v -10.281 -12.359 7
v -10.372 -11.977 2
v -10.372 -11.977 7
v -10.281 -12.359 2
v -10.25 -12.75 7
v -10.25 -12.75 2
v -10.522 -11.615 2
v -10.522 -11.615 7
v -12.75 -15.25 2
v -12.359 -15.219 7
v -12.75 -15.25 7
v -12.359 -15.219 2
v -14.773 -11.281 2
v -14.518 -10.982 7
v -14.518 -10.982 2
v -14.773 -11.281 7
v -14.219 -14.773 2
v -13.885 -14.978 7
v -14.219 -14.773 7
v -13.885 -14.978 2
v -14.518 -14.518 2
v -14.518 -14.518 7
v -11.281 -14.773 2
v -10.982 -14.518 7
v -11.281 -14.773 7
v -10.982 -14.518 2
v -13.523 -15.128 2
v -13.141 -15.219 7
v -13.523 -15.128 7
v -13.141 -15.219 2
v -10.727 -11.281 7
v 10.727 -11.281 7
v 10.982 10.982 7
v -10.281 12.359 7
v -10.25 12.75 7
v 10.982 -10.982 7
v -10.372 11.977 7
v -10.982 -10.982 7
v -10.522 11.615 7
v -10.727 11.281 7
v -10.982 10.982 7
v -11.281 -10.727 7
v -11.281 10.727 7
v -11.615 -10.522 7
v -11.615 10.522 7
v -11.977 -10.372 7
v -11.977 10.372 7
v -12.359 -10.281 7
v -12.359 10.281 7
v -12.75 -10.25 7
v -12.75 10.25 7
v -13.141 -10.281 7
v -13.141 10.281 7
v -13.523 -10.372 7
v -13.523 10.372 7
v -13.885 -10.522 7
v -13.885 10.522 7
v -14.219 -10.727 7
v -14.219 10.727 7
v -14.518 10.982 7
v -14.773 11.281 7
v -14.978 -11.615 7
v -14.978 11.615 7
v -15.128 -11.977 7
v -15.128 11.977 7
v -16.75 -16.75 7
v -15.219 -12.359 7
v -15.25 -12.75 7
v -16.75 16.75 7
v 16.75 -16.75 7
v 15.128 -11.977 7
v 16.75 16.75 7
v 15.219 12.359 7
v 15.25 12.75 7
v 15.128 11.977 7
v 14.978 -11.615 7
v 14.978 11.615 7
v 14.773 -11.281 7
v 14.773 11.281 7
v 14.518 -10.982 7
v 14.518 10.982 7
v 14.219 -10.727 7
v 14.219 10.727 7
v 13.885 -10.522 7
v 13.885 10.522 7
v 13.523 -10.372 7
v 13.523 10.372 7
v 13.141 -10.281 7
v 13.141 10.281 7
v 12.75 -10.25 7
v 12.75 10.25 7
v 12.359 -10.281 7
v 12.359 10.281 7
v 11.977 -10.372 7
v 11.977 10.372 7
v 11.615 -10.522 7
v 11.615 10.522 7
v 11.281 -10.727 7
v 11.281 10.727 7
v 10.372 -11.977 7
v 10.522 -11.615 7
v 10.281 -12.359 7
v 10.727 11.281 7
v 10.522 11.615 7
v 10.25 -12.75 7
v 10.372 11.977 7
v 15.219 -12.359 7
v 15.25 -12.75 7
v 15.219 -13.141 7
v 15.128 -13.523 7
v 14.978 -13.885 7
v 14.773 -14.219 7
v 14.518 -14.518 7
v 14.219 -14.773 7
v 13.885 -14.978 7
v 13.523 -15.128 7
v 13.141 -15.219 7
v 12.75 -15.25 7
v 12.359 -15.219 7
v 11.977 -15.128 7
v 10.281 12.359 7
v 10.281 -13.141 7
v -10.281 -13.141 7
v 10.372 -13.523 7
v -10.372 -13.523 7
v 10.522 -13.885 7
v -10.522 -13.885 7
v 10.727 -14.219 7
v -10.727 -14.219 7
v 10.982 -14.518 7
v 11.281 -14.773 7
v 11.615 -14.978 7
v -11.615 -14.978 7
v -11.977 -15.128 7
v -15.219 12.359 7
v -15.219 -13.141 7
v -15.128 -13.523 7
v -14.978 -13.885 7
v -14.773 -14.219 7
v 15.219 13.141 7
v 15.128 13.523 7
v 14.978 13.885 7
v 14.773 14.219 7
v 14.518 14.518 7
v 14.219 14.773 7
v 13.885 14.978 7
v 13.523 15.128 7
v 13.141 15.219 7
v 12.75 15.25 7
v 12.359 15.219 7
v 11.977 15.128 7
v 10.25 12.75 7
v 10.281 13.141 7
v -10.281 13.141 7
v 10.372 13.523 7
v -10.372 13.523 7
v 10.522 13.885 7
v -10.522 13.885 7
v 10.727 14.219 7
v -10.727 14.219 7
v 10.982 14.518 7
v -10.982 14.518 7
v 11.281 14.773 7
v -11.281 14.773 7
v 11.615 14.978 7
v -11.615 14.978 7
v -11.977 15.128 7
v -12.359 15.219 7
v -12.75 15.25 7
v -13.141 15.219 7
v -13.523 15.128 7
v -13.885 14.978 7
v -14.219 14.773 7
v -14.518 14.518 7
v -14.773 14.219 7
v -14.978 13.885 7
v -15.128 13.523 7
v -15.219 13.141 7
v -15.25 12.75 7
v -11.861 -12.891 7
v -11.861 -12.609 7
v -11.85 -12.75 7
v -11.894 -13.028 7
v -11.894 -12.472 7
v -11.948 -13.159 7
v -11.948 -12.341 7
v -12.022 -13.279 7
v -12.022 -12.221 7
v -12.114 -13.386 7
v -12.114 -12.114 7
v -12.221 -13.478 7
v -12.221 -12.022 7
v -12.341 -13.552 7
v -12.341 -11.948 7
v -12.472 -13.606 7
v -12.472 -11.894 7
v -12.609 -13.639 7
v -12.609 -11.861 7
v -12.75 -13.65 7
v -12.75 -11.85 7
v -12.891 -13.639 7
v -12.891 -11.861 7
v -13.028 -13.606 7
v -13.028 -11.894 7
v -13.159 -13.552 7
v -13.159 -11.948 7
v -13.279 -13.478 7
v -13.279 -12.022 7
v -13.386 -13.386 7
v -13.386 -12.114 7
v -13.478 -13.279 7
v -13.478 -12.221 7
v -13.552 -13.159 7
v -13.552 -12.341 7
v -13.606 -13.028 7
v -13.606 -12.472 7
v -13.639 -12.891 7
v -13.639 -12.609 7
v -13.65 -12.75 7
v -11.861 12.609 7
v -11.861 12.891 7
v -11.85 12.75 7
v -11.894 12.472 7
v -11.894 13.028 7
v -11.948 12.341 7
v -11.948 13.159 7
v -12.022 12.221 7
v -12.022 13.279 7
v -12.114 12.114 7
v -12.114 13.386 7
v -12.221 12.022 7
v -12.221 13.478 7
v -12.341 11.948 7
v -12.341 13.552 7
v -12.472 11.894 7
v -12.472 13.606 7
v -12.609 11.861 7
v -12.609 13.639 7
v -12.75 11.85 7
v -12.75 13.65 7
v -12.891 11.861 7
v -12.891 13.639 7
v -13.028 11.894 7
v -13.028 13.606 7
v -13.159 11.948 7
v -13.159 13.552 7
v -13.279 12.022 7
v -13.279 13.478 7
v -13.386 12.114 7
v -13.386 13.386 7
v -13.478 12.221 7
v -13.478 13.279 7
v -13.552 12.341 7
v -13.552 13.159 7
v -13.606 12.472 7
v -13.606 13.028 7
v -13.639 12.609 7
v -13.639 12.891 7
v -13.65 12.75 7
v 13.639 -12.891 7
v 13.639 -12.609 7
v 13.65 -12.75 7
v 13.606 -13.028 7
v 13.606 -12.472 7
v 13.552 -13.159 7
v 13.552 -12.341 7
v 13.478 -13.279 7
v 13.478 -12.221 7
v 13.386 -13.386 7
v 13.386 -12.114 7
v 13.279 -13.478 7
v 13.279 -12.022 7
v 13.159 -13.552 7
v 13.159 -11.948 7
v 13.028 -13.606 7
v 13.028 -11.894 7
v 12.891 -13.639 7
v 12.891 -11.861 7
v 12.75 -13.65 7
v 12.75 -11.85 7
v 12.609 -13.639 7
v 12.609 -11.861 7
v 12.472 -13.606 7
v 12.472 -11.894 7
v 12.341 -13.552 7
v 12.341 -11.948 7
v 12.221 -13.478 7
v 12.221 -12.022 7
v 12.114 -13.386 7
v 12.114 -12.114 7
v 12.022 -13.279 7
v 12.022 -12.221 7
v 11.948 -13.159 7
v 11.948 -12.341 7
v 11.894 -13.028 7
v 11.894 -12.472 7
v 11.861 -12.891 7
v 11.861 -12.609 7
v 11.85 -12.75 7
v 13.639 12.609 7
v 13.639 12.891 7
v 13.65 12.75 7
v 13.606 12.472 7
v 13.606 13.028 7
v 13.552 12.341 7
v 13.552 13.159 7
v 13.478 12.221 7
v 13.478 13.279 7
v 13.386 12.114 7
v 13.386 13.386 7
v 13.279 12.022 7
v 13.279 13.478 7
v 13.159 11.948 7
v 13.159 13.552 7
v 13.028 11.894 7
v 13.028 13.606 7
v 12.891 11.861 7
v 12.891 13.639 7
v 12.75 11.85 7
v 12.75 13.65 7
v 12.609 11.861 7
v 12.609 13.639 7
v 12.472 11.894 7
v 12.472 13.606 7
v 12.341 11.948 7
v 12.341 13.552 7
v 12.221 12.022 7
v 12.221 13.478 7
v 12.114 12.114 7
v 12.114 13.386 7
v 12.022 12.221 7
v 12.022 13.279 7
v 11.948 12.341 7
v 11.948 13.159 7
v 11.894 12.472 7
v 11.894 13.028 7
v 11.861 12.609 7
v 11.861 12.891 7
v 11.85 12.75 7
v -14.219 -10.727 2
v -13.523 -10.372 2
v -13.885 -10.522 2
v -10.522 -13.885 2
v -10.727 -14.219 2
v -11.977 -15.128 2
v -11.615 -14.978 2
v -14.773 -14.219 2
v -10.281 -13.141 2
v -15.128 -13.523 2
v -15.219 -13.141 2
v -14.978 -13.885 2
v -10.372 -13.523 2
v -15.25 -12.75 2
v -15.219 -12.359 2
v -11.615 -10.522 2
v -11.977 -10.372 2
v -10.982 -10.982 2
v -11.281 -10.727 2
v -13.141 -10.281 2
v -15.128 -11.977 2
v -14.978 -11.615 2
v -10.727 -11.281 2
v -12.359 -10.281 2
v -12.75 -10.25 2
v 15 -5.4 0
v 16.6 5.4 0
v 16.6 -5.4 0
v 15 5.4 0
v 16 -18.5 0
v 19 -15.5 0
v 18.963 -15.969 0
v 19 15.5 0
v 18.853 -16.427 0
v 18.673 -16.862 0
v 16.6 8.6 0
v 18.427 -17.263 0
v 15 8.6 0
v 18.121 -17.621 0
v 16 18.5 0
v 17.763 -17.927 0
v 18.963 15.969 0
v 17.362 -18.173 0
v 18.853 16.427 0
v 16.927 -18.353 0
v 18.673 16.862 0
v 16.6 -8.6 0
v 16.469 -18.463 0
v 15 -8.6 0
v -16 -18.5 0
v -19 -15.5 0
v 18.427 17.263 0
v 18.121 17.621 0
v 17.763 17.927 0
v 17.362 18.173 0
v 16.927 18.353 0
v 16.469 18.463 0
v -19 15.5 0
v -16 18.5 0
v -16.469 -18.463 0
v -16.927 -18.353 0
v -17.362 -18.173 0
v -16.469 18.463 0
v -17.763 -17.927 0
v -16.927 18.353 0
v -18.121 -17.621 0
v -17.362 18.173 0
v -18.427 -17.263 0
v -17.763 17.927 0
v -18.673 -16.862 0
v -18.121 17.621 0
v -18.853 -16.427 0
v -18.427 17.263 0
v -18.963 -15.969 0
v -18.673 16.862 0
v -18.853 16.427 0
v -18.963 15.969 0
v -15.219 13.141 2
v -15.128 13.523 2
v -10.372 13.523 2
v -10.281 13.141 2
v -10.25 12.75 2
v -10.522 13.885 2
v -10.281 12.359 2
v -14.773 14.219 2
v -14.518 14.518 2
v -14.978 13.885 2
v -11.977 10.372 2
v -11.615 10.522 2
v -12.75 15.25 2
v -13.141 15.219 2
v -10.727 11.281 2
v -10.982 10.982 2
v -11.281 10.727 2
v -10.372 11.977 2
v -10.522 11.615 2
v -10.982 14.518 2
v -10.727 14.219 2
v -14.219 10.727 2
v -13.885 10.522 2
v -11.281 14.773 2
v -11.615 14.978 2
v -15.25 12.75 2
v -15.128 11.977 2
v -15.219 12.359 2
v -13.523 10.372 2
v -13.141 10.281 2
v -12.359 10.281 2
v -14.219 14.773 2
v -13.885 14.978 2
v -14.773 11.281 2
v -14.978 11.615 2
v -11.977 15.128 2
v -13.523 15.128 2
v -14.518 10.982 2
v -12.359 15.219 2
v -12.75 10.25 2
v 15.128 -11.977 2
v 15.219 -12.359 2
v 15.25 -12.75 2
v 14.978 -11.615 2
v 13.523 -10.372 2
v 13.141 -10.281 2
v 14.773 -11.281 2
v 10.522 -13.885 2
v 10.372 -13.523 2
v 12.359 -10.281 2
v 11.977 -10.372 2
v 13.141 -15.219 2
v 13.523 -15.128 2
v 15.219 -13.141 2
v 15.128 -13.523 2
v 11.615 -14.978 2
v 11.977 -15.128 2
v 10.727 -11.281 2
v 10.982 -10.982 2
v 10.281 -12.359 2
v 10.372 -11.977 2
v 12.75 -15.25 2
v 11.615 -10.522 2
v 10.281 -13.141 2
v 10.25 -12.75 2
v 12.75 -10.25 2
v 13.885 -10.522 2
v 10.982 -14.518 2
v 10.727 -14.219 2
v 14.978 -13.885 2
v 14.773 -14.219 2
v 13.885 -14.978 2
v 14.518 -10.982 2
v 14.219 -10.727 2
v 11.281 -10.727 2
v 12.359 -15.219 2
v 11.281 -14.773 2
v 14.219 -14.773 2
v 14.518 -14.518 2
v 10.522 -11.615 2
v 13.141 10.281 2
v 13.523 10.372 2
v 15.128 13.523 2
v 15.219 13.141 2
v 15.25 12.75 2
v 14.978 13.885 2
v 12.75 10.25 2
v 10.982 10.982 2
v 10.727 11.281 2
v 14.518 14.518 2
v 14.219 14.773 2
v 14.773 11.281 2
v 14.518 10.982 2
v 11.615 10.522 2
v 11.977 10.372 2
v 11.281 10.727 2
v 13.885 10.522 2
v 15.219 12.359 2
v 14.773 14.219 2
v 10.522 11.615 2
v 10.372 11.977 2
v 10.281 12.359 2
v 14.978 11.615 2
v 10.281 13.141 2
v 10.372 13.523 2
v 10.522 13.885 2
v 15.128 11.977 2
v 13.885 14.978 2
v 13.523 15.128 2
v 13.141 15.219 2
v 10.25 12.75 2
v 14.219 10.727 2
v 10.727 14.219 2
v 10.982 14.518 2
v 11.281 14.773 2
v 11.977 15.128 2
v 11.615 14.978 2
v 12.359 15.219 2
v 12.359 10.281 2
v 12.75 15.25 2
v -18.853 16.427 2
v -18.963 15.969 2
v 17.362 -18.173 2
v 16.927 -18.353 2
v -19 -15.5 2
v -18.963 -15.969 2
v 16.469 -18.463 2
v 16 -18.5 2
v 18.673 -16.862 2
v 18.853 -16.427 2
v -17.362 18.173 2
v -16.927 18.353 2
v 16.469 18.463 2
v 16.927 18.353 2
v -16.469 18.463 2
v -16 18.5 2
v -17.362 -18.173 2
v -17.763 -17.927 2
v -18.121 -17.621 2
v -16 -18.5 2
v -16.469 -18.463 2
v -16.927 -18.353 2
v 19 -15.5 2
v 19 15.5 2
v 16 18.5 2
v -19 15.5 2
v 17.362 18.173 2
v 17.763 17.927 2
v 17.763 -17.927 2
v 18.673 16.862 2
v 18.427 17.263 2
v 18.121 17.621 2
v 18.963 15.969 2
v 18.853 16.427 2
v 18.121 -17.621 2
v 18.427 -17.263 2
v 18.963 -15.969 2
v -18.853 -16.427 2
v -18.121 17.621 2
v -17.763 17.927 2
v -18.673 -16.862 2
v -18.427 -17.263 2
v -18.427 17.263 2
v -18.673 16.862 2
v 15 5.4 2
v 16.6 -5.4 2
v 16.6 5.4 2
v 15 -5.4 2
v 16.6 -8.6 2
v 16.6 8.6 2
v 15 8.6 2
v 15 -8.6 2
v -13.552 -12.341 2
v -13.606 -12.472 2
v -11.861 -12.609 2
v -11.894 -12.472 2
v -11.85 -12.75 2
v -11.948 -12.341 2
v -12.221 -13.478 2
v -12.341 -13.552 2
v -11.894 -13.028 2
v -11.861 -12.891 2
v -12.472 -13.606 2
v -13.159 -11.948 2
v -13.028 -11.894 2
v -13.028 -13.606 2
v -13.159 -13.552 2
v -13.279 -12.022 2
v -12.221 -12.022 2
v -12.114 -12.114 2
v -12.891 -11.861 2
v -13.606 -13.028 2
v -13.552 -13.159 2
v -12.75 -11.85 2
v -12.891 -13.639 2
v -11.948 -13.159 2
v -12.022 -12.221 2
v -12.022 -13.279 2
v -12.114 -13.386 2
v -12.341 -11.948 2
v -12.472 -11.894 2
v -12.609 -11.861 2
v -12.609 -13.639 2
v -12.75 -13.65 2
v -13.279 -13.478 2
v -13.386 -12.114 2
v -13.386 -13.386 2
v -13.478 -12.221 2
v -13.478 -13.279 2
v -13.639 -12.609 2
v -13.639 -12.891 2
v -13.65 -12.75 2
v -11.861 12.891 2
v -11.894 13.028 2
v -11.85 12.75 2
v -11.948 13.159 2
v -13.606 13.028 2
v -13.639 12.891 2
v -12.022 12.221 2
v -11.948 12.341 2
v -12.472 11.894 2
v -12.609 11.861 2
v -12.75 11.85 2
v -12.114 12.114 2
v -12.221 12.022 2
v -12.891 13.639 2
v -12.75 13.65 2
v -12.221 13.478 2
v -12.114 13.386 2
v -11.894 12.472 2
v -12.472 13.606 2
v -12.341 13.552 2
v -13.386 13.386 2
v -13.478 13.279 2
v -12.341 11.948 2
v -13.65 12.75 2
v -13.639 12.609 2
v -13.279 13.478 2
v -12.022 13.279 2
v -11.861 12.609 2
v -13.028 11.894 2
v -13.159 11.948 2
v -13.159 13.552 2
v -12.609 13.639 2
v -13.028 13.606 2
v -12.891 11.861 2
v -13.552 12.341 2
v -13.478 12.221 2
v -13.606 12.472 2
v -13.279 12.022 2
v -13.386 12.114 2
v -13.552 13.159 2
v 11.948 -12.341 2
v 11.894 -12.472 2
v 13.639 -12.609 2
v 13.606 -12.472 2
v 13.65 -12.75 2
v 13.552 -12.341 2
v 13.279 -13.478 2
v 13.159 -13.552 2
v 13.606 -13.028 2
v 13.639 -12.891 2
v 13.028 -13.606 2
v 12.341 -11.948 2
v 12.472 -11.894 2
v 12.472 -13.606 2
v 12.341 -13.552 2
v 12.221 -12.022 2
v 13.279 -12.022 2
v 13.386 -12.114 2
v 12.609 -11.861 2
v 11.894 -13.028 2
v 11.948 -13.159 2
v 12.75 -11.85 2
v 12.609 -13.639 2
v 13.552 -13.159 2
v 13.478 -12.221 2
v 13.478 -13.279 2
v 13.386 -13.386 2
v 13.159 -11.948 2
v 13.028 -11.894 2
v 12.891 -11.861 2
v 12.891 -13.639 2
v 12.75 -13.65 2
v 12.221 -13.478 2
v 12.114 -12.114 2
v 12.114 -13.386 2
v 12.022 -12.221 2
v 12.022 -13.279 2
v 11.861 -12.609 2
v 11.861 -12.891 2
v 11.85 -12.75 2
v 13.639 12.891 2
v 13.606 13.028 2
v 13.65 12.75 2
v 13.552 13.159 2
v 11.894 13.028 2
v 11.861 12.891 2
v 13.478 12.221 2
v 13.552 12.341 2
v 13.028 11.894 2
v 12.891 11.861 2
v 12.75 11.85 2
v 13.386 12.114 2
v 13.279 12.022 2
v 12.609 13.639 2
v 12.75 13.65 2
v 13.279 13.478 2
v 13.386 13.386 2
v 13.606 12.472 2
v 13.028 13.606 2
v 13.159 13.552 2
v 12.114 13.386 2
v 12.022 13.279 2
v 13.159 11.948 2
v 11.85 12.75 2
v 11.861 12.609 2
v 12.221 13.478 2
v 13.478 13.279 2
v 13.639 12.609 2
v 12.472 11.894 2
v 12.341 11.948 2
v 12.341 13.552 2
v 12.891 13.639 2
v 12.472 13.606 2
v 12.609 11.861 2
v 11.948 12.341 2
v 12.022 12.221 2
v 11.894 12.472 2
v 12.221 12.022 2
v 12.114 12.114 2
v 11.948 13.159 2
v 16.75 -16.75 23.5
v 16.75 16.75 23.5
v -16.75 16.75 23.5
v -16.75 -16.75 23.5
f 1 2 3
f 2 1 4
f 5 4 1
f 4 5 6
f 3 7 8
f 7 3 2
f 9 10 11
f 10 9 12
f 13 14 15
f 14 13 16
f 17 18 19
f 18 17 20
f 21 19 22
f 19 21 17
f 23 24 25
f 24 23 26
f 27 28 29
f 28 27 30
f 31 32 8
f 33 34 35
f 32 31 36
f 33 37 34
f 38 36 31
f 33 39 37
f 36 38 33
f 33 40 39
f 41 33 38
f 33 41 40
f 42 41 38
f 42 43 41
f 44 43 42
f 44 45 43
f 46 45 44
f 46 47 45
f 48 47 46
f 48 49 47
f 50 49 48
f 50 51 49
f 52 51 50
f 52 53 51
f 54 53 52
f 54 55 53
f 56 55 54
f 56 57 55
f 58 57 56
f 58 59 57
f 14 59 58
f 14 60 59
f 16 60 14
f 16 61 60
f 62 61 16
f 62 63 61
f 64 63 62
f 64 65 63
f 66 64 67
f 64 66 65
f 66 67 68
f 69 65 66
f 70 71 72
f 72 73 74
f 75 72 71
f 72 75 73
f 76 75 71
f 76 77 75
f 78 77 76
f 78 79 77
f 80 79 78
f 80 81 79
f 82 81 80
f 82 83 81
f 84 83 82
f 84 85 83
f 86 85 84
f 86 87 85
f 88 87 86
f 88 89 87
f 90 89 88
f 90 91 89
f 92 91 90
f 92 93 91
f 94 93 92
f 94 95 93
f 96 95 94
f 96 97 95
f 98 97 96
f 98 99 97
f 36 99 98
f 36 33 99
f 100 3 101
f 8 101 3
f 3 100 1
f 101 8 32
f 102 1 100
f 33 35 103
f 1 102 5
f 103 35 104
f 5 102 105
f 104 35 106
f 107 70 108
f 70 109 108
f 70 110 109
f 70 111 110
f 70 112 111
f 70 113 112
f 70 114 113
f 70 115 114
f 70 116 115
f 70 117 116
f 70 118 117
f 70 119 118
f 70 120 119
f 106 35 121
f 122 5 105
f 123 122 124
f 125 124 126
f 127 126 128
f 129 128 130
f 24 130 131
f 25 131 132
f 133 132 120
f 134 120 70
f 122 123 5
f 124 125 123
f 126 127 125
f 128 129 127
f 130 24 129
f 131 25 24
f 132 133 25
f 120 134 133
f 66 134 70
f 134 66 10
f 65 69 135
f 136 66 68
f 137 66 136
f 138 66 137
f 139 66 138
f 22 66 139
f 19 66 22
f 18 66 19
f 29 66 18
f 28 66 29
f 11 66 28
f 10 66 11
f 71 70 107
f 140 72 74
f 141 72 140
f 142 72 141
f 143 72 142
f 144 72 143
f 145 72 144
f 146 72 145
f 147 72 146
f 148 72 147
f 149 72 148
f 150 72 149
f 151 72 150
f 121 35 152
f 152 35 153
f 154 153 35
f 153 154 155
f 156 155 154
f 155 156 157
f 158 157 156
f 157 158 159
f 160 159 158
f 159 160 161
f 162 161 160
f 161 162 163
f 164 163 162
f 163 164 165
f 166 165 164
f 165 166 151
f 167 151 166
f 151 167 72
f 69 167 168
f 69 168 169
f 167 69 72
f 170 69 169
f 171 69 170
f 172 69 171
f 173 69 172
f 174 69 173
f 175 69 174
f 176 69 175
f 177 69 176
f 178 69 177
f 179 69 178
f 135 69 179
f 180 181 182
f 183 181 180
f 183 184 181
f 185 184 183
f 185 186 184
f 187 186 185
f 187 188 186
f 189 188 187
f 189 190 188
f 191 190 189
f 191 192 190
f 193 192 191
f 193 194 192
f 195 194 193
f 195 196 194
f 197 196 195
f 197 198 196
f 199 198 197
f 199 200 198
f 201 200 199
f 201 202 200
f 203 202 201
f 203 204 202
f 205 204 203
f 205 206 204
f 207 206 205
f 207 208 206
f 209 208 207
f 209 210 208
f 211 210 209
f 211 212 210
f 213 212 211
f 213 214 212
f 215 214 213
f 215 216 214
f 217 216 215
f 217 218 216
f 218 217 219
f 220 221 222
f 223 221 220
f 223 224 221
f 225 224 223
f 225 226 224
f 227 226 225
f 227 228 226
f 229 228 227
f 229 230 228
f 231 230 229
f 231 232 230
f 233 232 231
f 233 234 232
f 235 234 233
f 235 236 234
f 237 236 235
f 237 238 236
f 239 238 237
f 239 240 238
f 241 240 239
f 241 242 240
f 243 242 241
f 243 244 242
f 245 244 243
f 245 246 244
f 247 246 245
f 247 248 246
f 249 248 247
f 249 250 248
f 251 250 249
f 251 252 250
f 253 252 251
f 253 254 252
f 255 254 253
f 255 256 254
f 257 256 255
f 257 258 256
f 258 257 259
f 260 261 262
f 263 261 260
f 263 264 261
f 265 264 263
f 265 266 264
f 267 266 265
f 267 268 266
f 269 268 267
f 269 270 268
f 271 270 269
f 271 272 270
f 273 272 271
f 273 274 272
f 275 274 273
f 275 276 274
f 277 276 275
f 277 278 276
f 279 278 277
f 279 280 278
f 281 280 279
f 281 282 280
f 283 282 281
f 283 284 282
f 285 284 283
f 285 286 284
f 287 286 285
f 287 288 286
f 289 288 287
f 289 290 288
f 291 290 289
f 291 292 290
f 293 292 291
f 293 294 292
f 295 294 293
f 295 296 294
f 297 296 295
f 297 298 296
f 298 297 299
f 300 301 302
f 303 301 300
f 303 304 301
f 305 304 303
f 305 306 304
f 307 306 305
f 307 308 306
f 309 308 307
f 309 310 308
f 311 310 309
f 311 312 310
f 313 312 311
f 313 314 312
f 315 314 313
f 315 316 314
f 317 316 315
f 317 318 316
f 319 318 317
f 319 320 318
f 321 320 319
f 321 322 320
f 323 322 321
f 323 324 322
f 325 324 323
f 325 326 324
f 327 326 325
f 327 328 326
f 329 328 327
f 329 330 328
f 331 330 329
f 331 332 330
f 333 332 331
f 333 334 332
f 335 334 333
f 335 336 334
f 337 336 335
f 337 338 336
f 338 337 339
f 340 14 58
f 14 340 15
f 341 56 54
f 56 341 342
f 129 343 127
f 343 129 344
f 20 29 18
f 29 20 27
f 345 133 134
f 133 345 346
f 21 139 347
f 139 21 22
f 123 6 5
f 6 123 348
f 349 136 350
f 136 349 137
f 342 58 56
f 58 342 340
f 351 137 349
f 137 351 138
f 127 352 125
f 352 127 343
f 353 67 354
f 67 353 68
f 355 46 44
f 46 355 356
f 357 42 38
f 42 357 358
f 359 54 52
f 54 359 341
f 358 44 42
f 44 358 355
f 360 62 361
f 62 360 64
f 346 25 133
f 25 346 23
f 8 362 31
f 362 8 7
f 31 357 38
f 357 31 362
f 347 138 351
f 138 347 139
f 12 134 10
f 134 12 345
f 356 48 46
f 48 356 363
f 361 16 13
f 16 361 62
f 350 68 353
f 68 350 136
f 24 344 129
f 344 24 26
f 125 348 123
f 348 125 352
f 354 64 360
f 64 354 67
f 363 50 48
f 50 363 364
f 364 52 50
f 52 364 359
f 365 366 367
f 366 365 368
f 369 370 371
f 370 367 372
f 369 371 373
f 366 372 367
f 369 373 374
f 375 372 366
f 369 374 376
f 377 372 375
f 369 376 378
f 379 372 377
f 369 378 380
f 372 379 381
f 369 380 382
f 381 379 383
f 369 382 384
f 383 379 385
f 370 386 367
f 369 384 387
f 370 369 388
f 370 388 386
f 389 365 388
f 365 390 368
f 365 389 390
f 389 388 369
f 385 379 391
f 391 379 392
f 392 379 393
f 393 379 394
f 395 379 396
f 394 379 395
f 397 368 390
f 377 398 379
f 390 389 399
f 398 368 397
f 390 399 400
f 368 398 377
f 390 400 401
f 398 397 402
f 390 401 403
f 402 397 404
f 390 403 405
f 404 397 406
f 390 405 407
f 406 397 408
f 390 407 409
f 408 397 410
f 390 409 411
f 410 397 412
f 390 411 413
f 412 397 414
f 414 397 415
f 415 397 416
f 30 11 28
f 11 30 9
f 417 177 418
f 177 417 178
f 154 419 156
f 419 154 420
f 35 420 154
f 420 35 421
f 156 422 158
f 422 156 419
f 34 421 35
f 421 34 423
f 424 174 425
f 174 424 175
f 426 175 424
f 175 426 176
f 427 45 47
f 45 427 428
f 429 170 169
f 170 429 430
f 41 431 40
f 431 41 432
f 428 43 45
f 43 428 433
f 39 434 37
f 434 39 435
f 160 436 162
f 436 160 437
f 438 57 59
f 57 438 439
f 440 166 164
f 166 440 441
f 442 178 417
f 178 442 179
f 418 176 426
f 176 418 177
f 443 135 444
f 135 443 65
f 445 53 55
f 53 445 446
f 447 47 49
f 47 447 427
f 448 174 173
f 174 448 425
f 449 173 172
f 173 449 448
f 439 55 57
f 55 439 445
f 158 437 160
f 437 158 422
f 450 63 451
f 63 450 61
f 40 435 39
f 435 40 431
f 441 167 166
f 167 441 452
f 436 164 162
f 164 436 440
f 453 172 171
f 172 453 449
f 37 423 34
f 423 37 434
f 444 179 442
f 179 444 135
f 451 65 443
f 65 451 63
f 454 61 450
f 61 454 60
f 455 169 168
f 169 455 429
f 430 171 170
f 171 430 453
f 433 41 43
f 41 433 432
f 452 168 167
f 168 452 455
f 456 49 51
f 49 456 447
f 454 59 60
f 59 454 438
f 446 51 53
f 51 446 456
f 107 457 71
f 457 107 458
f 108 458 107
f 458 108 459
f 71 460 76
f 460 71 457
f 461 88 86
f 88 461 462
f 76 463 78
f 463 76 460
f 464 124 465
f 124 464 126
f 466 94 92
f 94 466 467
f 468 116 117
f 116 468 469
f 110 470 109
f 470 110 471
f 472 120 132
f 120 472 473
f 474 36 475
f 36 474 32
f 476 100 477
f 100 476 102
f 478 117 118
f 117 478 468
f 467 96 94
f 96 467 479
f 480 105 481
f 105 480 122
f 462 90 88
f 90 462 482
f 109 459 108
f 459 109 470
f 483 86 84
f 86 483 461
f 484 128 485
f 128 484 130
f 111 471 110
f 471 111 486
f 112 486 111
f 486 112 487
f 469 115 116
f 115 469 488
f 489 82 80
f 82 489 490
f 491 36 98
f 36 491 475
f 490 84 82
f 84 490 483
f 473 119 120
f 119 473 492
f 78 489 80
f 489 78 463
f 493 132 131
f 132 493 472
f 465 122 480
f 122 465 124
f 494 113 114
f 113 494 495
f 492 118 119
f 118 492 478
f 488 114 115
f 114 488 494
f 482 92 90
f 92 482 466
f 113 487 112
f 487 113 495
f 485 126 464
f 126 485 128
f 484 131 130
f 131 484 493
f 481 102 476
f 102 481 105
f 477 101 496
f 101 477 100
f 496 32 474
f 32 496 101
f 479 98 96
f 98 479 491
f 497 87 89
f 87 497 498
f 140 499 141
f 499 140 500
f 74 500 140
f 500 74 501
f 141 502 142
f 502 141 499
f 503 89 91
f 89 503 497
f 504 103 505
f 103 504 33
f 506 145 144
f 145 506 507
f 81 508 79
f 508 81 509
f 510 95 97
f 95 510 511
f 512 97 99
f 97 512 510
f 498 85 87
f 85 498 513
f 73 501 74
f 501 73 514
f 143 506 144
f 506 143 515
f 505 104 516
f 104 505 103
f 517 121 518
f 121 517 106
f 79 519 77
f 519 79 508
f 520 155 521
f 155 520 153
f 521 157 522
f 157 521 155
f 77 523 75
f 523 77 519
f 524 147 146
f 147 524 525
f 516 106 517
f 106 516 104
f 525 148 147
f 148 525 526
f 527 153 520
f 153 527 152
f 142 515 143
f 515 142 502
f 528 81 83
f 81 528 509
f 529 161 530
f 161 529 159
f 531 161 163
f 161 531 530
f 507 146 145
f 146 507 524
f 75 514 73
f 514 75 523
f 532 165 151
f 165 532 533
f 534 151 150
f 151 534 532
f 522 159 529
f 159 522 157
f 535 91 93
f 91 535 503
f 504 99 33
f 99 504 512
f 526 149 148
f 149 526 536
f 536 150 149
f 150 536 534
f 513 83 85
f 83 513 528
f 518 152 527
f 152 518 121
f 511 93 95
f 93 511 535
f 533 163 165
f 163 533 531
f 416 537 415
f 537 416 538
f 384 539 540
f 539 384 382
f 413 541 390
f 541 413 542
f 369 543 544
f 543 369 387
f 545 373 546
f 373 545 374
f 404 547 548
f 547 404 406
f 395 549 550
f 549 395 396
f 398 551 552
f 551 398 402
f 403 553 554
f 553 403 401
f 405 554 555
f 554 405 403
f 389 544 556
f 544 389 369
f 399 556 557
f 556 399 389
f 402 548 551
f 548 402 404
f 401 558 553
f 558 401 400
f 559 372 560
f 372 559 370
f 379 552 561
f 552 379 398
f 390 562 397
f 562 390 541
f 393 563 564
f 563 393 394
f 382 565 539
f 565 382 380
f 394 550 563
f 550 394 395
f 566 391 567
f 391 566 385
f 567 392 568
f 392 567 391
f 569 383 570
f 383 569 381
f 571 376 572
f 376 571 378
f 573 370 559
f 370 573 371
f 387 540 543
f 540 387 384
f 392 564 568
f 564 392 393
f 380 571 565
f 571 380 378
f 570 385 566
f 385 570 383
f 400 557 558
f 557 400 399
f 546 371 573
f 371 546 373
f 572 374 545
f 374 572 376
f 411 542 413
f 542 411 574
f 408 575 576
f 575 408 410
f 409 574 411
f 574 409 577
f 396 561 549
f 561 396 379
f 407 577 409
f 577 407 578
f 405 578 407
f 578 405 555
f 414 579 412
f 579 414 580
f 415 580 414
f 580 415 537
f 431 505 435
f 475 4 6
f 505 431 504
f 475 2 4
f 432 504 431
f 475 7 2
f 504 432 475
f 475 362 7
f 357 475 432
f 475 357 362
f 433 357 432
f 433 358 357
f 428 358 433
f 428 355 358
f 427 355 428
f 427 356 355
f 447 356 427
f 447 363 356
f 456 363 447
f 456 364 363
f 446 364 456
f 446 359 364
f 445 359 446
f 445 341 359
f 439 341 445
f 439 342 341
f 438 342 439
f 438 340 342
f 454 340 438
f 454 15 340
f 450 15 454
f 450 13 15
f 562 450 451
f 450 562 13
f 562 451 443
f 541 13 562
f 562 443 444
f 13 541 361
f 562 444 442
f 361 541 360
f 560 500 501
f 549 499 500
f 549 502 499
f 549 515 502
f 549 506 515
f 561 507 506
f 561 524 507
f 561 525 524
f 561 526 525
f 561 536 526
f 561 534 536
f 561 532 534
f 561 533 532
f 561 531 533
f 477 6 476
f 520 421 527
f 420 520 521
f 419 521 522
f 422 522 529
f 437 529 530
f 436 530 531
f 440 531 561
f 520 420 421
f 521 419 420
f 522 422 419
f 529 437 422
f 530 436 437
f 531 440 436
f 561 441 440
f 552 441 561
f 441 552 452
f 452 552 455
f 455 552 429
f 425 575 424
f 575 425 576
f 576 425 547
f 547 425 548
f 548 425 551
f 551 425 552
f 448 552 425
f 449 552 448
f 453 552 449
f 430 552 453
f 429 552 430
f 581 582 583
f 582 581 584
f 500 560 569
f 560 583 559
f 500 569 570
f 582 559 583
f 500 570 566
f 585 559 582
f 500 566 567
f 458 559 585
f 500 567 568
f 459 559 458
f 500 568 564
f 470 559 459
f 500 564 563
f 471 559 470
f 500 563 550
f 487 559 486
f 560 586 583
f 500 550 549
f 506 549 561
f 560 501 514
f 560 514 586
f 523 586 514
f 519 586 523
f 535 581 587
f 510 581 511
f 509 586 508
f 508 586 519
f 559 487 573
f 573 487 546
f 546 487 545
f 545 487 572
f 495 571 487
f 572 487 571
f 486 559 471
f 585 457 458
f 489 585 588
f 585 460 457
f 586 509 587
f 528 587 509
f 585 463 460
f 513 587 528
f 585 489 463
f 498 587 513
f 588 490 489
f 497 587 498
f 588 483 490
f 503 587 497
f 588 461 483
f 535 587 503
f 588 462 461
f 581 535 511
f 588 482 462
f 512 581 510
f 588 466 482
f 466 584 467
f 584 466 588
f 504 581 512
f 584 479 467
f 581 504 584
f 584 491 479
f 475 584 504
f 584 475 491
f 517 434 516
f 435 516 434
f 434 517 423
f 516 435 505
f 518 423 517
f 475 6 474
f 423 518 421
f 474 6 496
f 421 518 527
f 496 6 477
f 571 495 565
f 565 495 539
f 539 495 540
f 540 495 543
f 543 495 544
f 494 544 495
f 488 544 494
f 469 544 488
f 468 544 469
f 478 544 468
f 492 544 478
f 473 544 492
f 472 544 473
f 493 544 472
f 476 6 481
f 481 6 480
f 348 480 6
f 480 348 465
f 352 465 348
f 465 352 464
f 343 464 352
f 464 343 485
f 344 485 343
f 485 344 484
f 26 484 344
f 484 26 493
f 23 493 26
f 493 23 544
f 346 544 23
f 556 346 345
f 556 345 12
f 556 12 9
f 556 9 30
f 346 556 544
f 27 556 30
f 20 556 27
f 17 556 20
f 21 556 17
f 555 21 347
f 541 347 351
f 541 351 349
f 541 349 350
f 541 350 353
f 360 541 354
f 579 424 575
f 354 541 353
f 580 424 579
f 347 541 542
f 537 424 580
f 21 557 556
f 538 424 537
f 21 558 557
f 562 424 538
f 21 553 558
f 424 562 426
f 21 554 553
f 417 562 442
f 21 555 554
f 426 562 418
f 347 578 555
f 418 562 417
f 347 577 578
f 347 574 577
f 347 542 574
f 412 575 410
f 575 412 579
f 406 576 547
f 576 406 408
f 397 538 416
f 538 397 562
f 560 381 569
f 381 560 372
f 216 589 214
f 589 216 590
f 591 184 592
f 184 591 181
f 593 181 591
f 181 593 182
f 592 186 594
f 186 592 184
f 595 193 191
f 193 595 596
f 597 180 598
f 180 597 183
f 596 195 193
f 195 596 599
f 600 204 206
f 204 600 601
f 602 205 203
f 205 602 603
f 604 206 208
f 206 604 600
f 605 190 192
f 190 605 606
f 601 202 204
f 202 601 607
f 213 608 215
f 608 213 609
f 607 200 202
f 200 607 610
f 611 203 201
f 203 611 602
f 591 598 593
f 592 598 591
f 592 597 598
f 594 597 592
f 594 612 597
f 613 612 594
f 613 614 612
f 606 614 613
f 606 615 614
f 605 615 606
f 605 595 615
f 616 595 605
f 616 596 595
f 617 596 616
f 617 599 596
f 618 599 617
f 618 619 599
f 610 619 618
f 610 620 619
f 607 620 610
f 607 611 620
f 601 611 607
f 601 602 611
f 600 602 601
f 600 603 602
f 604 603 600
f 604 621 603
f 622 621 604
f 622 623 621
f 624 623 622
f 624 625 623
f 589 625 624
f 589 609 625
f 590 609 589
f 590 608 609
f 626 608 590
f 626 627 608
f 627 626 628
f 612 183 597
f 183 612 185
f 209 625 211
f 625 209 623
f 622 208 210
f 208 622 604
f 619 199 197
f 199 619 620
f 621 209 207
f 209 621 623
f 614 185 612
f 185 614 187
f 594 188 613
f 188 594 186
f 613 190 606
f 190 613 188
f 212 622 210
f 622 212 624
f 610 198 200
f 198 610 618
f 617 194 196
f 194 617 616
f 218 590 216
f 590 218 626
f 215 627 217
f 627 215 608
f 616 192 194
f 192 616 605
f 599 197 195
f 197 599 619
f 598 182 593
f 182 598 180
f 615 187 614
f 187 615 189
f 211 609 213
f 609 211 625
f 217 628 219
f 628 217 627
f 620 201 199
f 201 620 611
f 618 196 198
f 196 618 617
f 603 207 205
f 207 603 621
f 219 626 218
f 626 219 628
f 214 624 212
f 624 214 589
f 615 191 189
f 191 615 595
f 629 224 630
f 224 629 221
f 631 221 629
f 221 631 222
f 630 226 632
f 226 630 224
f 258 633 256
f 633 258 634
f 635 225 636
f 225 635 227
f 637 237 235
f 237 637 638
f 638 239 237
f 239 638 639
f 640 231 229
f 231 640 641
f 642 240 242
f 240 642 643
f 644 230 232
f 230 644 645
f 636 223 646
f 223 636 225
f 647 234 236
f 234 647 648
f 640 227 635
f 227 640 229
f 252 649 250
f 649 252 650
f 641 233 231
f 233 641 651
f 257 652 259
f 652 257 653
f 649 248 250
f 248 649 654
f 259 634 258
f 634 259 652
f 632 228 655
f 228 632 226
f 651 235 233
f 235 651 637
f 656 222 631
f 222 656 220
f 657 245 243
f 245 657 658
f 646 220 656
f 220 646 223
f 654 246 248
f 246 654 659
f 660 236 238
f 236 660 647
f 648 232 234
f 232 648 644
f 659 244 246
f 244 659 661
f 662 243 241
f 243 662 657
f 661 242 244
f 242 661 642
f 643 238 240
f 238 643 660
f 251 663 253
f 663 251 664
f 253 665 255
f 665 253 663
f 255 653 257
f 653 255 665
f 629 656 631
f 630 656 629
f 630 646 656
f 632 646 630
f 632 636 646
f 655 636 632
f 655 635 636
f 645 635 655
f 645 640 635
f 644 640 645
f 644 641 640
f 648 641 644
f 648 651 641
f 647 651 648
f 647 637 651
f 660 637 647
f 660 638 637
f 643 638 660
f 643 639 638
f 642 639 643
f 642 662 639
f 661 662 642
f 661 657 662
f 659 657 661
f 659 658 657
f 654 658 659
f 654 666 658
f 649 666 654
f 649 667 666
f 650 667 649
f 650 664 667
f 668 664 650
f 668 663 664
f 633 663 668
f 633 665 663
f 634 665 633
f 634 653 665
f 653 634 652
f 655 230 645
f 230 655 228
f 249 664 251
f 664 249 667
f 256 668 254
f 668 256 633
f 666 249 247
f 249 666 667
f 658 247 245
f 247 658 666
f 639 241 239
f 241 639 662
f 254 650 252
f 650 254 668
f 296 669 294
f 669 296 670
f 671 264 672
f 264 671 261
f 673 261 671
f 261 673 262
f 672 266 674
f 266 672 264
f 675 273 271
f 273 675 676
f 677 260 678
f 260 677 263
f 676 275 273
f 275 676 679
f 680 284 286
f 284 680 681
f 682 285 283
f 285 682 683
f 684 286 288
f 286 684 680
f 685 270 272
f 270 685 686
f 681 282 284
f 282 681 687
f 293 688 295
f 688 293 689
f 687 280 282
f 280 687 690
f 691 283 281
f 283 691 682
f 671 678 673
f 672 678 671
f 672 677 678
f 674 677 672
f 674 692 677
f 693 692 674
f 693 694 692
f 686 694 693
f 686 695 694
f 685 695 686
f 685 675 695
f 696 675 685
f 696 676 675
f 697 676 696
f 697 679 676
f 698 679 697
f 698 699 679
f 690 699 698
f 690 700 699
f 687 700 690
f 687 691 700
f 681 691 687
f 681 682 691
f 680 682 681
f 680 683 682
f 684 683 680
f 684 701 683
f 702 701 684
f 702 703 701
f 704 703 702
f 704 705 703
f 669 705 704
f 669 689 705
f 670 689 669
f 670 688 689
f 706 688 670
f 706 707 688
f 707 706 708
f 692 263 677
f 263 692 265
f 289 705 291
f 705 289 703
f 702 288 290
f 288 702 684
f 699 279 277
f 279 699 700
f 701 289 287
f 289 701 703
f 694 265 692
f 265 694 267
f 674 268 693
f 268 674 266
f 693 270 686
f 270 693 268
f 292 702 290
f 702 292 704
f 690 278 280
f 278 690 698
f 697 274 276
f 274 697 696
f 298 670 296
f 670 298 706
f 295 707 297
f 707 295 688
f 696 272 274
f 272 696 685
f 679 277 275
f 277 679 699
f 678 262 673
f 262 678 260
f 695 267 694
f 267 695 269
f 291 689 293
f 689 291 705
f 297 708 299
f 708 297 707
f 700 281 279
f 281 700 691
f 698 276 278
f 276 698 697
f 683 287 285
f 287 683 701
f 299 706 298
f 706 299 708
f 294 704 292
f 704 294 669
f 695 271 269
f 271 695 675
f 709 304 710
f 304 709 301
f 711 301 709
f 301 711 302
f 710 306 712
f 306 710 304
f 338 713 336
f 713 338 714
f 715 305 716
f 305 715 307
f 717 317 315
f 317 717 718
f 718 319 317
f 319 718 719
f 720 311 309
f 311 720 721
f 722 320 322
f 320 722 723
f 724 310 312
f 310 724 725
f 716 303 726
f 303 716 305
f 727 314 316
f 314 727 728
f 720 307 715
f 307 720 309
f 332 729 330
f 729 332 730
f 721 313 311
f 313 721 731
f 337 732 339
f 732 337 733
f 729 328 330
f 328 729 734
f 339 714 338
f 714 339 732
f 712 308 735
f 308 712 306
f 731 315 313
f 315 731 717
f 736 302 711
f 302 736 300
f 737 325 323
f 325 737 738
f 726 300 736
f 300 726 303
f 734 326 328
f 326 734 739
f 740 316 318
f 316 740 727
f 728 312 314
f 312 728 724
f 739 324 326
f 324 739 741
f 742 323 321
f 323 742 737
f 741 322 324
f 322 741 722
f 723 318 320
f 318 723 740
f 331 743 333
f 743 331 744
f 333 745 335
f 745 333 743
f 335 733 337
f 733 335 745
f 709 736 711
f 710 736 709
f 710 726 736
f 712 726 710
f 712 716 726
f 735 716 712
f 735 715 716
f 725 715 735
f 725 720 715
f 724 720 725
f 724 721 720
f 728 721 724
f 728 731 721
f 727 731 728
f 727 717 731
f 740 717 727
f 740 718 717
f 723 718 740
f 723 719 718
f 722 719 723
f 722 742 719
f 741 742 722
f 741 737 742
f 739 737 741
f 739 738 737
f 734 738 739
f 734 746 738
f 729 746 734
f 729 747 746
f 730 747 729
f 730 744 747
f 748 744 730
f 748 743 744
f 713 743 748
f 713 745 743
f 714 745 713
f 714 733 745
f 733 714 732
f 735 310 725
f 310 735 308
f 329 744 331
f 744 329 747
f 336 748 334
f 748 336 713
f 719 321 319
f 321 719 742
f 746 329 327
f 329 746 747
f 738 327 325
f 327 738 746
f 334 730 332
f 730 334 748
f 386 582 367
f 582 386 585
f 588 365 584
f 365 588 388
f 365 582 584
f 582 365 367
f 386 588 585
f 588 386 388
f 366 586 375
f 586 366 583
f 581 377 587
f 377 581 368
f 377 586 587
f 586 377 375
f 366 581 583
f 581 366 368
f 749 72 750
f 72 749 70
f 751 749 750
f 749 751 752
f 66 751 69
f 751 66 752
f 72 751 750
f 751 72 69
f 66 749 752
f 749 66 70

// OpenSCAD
// arabskie_gogle — UCHWYT AI BOXA kamery TR1-220SL na prawym boku HDO2 — v0.1 (WERSJA ROBOCZA)
// AI Box: 33,5 × 33,5 × 16,5 mm, otwory 25,5 × 25,5 (rysunek BZB UAS: papers/bzbuas_tr1-220sl_dimensions_aibox_thermal.png),
// złącza: CVBS + zasilanie (3-pin, lewy bok na rysunku), GPIO/UART (6-pin, góra), OSD (2-pin, prawy bok),
// USB (4-pin, prawy bok), złącze kamer na spodzie (widok z boku) — papers/bzbuas_tr1-220sl_wiring_diagram.png.
// Dlaczego prawy bok: tu są gniazdo AV i zasilania HDO2 (research/07b), więc CVBS i zasilanie mają krótkie
// przewody. Masa równoważy pod po lewej. Przewody kamer idą od przodu po górnej krawędzi.
// Mocowanie: taśma 3M VHB 5952 (research/07c) na płaskiej części boku przed gniazdem AV (≈37 × 36 mm, 07b c-R).
// Zasłania drzwiczki Expansion Bay (zworka trybu zasilania) — zdjąć uchwyt, jeśli trzeba się do niej dostać.
//
// Układ lokalny: x = do przodu gogli, y = w górę, z = na zewnątrz w PRAWO (z = 0 = bok gogli). Prawoskrętny.

part = "assembly";
$fn = 40;

box   = [33.5, 33.5, 16.5];
// ROZSTAW OTWORÓW — DWA RYSUNKI SKLEPU SIĘ RÓŻNIĄ: rysunek wymiarowy (…_dimensions_aibox_thermal.png, „Unit: mm”)
// podaje 25.5, a grafika z wymiarami w tym samym zestawie (papers/bzbuas_tr1-220sl_dimensions_infra.png) podaje „25mm”.
// Przyjęte 25.5 (rysunek wymiarowy). Przy pilotach Ø1.8 pod M2 różnica 0.5 mm ma znaczenie → ZMIERZYĆ po dostawie,
// przed drukiem uchwytu.
hole  = 25.5;           // [A] rozstaw otworów AI boxa (25.5 albo 25 — patrz wyżej)
base  = [38, 37];       // płytka pod VHB (07b: ≈37 × 36 przed gniazdem AV — do pomiaru P3)
base_t = 2.0;
so_h  = 5.0;            // dystanse: miejsce na złącze kamer od spodu boxa i wyjście przewodu bokiem [A]
so_d  = 5.0;
m2_pilot = 1.8;
tie   = [3.2, 1.6];     // szczeliny na opaskę (przewód kamer)

module aibox_ghost() {  // atrapa AI boxa na dystansach
    color("dimgray") translate([0, 0, base_t + so_h]) translate([-box[0]/2, -box[1]/2, 0]) cube(box);
}
module aibox_mount() {
    difference() {
        union() {
            translate([-base[0]/2, -base[1]/2, 0]) linear_extrude(base_t) offset(3) offset(-3) square(base);
            for (sx = [-1, 1], sy = [-1, 1]) translate([sx*hole/2, sy*hole/2, 0]) cylinder(d = so_d, h = base_t + so_h);
        }
        for (sx = [-1, 1], sy = [-1, 1]) translate([sx*hole/2, sy*hole/2, base_t]) cylinder(d = m2_pilot, h = so_h + 1);
        // szczeliny na opaskę przy przedniej krawędzi (przewód kamer przychodzi z przodu)
        for (sy = [-1, 1]) translate([base[0]/2 - 4, sy*7 - tie[0]/2, -1]) cube([tie[1], tie[0], base_t + 2]);
    }
}
module assembly() { color("steelblue") aibox_mount(); aibox_ghost(); }
// do gogli (x do przodu, y w lewo, z w górę): (x, y, z) → (x, −z, y)
module to_goggle_right() { multmatrix([[1,0,0,0],[0,0,-1,0],[0,1,0,0],[0,0,0,1]]) children(); }

if (part == "mount") aibox_mount();
else if (part == "print") aibox_mount();
else if (part == "assembly") assembly();
else if (part == "none") { }
